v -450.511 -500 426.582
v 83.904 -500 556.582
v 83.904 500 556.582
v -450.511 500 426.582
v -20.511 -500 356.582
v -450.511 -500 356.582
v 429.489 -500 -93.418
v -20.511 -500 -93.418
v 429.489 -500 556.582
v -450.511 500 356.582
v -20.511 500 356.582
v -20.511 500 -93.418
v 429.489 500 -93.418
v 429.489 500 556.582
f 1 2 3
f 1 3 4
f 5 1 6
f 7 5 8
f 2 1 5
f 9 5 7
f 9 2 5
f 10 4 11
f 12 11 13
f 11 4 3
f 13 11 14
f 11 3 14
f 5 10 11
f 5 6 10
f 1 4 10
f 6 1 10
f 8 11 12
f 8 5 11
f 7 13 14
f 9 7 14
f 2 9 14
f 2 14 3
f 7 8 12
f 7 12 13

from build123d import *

# Parameters (mm, degrees)
F0_W          = 450
F0_H          = 50
F1_DEPTH      = 500
F1_DEPTH_BACK = 500


with BuildPart() as f1:
    # F0 (on Front) → F1 (new body, two sides)
    with BuildSketch(Plane.XZ) as f1_sk:
        Polygon((-20.51137, 356.582467), (-20.51137, -43.417533), (429.48863, -43.417533), (429.48863, 556.582467), (83.904198, 556.582467), (-450.51137, 426.582467), (-450.51137, 356.582467), align=None)
        with Locations((204.48863, -68.417533)):
            Rectangle(F0_W, F0_H)
    extrude(amount=F1_DEPTH)
    extrude(f1_sk.sketch, amount=-F1_DEPTH_BACK)


solid = f1.part
